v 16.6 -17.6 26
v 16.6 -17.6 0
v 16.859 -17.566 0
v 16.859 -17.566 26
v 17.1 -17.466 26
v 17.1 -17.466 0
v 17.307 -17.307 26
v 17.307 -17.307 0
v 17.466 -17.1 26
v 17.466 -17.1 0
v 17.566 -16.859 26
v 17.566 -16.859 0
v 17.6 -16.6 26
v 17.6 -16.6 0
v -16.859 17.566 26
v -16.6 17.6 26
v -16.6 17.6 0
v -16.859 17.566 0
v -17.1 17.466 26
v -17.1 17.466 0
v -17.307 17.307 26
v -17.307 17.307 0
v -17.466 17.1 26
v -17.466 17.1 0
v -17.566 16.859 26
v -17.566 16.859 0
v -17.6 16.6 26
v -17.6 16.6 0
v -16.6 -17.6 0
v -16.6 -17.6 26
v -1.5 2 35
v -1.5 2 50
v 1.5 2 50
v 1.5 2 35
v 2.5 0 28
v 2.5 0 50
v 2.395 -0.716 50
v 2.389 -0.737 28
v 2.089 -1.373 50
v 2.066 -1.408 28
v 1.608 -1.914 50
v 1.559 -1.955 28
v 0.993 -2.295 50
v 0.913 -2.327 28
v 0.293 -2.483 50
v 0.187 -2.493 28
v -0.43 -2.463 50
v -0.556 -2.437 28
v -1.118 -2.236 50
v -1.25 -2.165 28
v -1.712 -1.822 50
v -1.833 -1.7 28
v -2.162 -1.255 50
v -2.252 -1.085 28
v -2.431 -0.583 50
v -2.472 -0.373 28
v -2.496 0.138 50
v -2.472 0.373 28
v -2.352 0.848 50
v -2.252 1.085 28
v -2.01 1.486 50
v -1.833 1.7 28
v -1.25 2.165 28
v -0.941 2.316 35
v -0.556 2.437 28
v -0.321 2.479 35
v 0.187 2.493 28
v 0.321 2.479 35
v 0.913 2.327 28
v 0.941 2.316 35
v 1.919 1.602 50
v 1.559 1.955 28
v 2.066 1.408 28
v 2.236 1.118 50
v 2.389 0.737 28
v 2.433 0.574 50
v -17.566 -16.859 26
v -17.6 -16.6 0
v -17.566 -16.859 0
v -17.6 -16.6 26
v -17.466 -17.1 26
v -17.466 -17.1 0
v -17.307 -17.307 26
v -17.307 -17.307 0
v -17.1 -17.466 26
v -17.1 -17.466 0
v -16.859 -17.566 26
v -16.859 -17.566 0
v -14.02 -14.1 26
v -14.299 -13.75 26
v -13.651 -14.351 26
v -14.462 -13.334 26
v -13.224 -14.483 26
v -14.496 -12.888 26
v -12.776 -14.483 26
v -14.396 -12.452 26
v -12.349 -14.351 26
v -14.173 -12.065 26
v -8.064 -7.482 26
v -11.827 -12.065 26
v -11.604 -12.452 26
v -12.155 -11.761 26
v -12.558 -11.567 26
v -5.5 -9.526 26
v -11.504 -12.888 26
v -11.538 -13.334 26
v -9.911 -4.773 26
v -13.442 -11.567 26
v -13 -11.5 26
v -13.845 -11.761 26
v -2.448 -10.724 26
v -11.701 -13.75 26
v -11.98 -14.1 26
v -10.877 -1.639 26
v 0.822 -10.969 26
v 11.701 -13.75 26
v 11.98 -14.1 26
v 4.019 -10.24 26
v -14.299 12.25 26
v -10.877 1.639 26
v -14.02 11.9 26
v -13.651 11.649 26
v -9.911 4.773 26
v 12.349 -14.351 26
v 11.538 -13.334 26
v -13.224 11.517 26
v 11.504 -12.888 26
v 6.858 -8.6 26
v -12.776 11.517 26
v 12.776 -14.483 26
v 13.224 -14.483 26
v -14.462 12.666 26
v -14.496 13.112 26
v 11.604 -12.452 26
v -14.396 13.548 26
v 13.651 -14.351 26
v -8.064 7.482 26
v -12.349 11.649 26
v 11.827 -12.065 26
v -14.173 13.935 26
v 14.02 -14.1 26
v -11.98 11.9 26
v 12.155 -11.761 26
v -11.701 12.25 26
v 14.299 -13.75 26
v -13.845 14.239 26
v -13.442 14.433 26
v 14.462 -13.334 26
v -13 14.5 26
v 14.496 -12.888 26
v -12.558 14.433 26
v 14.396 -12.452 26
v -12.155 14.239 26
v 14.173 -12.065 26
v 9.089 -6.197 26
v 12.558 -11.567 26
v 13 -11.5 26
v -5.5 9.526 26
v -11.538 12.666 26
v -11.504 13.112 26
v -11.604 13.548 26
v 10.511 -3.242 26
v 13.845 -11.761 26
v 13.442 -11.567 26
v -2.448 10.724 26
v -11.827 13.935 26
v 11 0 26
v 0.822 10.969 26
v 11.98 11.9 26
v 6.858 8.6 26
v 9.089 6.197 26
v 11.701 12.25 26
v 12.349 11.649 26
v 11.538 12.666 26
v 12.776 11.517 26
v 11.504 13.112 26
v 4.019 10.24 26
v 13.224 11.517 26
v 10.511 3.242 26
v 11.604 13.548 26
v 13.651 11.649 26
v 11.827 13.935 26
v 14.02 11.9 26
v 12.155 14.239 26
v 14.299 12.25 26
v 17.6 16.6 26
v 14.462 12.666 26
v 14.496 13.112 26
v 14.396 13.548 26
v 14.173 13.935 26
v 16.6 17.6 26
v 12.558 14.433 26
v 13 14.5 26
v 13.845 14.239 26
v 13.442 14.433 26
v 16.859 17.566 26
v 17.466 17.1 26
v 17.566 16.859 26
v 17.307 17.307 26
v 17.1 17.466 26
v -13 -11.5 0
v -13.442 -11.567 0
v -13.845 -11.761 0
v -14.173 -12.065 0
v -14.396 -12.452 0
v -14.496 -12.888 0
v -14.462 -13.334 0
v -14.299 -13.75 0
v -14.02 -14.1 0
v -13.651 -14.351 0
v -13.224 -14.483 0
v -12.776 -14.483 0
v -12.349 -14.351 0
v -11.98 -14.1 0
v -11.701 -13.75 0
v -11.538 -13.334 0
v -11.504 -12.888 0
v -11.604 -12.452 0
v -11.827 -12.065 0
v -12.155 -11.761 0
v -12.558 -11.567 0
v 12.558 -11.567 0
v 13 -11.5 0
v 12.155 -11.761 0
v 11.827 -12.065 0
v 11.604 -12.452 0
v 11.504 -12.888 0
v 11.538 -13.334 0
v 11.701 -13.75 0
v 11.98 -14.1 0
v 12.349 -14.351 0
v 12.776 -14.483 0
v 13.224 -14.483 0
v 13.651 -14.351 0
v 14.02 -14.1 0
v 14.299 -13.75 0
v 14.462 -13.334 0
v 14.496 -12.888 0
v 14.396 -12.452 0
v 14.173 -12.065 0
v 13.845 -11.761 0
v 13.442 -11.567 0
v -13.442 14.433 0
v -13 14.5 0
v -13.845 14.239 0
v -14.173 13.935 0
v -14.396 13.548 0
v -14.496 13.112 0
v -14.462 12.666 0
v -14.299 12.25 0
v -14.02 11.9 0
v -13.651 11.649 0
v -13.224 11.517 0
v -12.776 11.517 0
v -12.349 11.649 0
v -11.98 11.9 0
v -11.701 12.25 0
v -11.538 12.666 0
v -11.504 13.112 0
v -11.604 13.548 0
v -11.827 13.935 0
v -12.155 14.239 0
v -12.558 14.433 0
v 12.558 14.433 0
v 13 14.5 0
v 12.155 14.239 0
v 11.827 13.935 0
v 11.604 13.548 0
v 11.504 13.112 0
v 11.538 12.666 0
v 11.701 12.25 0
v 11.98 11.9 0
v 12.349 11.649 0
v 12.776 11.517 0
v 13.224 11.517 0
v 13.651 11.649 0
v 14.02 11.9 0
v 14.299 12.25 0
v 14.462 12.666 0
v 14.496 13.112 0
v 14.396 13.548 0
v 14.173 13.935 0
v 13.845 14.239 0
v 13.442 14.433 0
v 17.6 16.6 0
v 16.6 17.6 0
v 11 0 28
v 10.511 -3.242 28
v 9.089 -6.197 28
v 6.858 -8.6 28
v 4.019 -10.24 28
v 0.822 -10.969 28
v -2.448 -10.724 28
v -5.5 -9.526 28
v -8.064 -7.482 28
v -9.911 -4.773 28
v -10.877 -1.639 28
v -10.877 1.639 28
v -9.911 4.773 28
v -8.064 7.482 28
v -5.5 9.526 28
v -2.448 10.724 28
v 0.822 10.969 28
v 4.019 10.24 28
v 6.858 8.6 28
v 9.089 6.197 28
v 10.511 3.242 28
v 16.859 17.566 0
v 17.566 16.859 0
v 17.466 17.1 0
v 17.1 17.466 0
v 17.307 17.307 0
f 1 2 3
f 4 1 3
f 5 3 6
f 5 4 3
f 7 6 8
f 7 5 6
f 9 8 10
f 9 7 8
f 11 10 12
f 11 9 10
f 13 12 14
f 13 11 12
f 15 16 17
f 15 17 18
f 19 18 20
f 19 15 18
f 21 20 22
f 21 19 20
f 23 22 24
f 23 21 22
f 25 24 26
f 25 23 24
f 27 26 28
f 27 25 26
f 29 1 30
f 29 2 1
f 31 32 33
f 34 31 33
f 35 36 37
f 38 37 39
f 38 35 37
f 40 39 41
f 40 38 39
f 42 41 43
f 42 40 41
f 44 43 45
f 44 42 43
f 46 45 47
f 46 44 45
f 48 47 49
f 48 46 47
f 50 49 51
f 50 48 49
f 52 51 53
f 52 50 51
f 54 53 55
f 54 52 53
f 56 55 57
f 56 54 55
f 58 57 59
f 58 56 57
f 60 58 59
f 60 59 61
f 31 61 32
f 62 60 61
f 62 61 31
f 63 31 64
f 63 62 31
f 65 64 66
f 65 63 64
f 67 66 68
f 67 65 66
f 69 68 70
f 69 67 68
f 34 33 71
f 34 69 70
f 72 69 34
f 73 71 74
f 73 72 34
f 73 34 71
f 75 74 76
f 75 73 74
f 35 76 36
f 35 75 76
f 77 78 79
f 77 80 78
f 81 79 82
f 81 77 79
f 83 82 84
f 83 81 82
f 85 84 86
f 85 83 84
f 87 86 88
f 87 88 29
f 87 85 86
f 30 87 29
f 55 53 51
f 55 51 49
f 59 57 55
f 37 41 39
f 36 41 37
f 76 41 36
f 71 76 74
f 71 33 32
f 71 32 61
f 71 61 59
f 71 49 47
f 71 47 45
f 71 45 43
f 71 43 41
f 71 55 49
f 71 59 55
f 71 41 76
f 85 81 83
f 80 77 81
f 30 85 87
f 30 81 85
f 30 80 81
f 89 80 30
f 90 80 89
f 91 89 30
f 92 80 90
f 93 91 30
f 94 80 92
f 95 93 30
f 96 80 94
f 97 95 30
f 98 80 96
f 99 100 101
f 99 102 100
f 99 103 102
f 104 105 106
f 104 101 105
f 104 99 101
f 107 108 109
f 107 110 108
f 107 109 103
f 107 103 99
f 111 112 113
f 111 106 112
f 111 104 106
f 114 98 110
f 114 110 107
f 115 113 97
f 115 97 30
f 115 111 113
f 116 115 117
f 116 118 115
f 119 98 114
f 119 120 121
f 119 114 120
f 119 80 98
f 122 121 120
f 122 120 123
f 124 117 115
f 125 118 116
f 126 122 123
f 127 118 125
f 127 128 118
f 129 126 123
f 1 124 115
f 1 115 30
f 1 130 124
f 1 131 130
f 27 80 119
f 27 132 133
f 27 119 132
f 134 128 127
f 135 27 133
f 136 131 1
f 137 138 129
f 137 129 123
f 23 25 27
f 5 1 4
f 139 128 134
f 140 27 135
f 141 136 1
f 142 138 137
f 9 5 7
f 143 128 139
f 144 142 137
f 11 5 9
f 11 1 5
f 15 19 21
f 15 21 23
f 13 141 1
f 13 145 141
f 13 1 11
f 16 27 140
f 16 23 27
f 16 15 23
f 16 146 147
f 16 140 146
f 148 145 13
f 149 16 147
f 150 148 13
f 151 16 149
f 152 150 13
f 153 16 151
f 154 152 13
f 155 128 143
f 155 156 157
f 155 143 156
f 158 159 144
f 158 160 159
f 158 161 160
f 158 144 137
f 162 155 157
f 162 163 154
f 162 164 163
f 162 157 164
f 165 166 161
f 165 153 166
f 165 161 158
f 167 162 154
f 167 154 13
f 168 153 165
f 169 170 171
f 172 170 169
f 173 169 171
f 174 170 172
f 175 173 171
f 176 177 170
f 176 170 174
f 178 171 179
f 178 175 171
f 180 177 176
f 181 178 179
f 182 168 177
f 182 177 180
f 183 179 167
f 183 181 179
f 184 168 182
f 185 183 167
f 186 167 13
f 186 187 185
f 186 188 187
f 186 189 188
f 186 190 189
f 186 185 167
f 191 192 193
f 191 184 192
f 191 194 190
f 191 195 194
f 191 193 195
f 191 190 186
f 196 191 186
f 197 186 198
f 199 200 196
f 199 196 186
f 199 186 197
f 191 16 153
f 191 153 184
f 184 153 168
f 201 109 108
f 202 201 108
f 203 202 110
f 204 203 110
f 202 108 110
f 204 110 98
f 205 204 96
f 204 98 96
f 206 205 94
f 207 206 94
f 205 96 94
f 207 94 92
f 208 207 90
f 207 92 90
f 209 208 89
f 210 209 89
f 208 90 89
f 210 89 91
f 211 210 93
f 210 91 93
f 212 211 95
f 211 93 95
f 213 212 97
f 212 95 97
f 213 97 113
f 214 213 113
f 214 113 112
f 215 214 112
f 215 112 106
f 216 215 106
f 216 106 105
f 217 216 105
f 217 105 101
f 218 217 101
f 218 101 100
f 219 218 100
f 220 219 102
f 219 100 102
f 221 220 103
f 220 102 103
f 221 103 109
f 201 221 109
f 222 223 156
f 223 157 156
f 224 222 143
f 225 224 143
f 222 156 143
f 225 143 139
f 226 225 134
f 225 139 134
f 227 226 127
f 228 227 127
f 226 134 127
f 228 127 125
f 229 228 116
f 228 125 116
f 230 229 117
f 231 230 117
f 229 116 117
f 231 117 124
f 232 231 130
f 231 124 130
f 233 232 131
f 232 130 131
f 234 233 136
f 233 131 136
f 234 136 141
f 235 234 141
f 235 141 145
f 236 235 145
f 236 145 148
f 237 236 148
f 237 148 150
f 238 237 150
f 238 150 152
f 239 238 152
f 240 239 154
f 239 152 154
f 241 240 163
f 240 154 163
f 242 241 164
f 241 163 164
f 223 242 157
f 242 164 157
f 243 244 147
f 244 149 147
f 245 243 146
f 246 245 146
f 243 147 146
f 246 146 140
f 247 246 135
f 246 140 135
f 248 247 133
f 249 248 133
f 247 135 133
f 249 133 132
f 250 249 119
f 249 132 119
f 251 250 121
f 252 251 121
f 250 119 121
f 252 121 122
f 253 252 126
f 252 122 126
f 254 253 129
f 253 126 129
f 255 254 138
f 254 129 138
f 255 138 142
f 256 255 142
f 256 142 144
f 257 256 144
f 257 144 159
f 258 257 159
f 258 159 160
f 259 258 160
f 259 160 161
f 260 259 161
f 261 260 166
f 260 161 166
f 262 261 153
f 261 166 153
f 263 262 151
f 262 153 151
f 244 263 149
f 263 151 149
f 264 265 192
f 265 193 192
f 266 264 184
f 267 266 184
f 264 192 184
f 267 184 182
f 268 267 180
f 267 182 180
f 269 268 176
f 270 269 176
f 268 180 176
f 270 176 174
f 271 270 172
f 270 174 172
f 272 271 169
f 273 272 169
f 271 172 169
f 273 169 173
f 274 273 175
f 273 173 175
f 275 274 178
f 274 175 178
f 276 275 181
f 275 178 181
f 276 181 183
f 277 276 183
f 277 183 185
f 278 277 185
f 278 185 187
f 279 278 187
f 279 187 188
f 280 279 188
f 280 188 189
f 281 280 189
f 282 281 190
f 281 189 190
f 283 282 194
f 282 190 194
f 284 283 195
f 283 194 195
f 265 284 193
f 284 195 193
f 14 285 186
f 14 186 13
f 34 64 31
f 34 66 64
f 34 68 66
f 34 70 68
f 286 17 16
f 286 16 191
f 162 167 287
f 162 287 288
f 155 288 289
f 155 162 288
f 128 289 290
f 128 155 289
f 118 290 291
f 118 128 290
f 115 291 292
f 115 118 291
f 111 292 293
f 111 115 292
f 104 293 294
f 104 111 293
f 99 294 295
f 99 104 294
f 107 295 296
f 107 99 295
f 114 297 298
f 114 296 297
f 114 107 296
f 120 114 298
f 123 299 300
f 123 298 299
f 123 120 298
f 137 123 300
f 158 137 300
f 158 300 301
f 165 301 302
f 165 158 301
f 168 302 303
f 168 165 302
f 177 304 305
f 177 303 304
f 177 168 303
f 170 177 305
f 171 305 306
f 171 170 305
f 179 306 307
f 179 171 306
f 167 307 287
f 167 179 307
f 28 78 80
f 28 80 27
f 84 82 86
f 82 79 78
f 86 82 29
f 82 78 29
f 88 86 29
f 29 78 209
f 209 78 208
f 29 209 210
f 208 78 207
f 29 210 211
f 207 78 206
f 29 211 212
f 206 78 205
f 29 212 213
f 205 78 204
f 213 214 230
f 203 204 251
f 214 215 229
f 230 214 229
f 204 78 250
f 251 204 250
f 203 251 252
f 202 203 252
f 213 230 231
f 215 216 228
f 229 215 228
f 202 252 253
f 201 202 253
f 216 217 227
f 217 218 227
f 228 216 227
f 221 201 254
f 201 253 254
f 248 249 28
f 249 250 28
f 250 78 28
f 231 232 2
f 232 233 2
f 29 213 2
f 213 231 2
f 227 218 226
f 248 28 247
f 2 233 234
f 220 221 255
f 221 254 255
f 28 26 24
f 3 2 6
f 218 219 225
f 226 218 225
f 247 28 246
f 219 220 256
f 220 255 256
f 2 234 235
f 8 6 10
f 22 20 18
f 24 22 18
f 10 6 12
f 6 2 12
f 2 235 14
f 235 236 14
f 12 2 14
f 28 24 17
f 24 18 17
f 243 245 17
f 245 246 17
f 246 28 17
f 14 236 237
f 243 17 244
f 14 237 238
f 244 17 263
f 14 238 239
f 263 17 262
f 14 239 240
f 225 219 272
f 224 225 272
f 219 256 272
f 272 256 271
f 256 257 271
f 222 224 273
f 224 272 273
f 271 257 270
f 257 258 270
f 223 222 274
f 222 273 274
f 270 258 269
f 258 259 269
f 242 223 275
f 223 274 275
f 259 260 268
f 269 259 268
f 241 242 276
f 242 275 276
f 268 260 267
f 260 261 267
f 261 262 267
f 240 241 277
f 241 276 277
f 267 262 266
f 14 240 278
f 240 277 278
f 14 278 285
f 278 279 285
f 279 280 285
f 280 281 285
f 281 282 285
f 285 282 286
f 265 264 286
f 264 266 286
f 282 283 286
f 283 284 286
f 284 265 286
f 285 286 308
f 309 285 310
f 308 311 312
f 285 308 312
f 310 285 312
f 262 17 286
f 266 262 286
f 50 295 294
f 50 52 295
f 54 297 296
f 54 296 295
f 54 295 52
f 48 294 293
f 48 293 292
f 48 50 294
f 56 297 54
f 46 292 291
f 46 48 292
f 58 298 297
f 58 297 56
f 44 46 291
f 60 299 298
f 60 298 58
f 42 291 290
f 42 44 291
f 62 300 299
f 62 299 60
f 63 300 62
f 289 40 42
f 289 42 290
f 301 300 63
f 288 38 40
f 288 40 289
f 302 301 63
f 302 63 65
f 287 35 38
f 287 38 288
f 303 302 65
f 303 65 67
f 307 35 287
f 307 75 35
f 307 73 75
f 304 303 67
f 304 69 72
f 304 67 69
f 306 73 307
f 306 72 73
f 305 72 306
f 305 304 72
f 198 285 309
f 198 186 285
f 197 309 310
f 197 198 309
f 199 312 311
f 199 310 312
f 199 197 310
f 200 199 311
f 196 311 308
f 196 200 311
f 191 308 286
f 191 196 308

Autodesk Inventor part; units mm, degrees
ref_plane "YZ Plane" through (0, 0, 0) normal (1, 0, 0) x (0, 1, 0)
ref_plane "XZ Plane" through (0, 0, 0) normal (0, 1, 0) x (-1, 0, 0)
ref_plane "XY Plane" through (0, 0, 0) normal (0, 0, 1) x (1, 0, 0)
sketch "Эскиз1" plane through (0, 0, 0) normal (0, 0, 1) x (1, 0, 0)
  line L0 (-17.6, 17.6) -> (17.6, 17.6)
  line L1 (17.6, 17.6) -> (17.6, -17.6)
  line L2 (17.6, -17.6) -> (-17.6, -17.6)
  line L3 (-17.6, -17.6) -> (-17.6, 17.6)
  point P0 (13, -13)
  point P1 (-13, -13)
  point P2 (13, 13)
  point P3 (-13, 13)
  dimension "d0" = 35.2
  dimension "d1" = 35.2
extrude "Выдавливание1" add sketch "Эскиз1" along normal blind 26
sketch "Эскиз2" plane through (0, 0, 26) normal (0, 0, 1) x (1, 0, 0)
  circle A0 centre (0, 0) radius 11
  dimension "d6" = 22
extrude "Выдавливание2" add sketch "Эскиз2" along normal blind 2
sketch "Эскиз3" plane through (0, 0, 28) normal (0, 0, 1) x (1, 0, 0)
  circle A0 centre (0, 0) radius 11 projected
  circle A1 centre (0, 0) radius 2.5
  dimension "d9" = 5
extrude "Выдавливание3" add sketch "Эскиз3" along normal blind 22 contours A1
sketch "Эскиз4" plane through (0, 0, 50) normal (0, 0, 1) x (1, 0, 0)
  line L0 (0, 2) -> (3.1194, 2)
  line L1 (3.1194, 2) -> (3.1194, 3.4913)
  line L2 (3.1194, 3.4913) -> (-4.7004, 3.4913)
  line L3 (-4.7004, 3.4913) -> (-4.7004, 2)
  line L4 (-4.7004, 2) -> (0, 2)
extrude "Выдавливание4" cut sketch "Эскиз4" against normal blind 15
hole "Отверстие1" at (13, -13, 0) at (13, 13, 0) at (-13, 13, 0) at (-13, -13, 0) direction (0, 0, 1) diameter 3 end through all
fillet "Сопряжение1" radius 1 4 edges at (-17.6, -17.6, 13) (17.6, -17.6, 13) (17.6, 17.6, 13) (-17.6, 17.6, 13)
properties part number "MotorNema14"
